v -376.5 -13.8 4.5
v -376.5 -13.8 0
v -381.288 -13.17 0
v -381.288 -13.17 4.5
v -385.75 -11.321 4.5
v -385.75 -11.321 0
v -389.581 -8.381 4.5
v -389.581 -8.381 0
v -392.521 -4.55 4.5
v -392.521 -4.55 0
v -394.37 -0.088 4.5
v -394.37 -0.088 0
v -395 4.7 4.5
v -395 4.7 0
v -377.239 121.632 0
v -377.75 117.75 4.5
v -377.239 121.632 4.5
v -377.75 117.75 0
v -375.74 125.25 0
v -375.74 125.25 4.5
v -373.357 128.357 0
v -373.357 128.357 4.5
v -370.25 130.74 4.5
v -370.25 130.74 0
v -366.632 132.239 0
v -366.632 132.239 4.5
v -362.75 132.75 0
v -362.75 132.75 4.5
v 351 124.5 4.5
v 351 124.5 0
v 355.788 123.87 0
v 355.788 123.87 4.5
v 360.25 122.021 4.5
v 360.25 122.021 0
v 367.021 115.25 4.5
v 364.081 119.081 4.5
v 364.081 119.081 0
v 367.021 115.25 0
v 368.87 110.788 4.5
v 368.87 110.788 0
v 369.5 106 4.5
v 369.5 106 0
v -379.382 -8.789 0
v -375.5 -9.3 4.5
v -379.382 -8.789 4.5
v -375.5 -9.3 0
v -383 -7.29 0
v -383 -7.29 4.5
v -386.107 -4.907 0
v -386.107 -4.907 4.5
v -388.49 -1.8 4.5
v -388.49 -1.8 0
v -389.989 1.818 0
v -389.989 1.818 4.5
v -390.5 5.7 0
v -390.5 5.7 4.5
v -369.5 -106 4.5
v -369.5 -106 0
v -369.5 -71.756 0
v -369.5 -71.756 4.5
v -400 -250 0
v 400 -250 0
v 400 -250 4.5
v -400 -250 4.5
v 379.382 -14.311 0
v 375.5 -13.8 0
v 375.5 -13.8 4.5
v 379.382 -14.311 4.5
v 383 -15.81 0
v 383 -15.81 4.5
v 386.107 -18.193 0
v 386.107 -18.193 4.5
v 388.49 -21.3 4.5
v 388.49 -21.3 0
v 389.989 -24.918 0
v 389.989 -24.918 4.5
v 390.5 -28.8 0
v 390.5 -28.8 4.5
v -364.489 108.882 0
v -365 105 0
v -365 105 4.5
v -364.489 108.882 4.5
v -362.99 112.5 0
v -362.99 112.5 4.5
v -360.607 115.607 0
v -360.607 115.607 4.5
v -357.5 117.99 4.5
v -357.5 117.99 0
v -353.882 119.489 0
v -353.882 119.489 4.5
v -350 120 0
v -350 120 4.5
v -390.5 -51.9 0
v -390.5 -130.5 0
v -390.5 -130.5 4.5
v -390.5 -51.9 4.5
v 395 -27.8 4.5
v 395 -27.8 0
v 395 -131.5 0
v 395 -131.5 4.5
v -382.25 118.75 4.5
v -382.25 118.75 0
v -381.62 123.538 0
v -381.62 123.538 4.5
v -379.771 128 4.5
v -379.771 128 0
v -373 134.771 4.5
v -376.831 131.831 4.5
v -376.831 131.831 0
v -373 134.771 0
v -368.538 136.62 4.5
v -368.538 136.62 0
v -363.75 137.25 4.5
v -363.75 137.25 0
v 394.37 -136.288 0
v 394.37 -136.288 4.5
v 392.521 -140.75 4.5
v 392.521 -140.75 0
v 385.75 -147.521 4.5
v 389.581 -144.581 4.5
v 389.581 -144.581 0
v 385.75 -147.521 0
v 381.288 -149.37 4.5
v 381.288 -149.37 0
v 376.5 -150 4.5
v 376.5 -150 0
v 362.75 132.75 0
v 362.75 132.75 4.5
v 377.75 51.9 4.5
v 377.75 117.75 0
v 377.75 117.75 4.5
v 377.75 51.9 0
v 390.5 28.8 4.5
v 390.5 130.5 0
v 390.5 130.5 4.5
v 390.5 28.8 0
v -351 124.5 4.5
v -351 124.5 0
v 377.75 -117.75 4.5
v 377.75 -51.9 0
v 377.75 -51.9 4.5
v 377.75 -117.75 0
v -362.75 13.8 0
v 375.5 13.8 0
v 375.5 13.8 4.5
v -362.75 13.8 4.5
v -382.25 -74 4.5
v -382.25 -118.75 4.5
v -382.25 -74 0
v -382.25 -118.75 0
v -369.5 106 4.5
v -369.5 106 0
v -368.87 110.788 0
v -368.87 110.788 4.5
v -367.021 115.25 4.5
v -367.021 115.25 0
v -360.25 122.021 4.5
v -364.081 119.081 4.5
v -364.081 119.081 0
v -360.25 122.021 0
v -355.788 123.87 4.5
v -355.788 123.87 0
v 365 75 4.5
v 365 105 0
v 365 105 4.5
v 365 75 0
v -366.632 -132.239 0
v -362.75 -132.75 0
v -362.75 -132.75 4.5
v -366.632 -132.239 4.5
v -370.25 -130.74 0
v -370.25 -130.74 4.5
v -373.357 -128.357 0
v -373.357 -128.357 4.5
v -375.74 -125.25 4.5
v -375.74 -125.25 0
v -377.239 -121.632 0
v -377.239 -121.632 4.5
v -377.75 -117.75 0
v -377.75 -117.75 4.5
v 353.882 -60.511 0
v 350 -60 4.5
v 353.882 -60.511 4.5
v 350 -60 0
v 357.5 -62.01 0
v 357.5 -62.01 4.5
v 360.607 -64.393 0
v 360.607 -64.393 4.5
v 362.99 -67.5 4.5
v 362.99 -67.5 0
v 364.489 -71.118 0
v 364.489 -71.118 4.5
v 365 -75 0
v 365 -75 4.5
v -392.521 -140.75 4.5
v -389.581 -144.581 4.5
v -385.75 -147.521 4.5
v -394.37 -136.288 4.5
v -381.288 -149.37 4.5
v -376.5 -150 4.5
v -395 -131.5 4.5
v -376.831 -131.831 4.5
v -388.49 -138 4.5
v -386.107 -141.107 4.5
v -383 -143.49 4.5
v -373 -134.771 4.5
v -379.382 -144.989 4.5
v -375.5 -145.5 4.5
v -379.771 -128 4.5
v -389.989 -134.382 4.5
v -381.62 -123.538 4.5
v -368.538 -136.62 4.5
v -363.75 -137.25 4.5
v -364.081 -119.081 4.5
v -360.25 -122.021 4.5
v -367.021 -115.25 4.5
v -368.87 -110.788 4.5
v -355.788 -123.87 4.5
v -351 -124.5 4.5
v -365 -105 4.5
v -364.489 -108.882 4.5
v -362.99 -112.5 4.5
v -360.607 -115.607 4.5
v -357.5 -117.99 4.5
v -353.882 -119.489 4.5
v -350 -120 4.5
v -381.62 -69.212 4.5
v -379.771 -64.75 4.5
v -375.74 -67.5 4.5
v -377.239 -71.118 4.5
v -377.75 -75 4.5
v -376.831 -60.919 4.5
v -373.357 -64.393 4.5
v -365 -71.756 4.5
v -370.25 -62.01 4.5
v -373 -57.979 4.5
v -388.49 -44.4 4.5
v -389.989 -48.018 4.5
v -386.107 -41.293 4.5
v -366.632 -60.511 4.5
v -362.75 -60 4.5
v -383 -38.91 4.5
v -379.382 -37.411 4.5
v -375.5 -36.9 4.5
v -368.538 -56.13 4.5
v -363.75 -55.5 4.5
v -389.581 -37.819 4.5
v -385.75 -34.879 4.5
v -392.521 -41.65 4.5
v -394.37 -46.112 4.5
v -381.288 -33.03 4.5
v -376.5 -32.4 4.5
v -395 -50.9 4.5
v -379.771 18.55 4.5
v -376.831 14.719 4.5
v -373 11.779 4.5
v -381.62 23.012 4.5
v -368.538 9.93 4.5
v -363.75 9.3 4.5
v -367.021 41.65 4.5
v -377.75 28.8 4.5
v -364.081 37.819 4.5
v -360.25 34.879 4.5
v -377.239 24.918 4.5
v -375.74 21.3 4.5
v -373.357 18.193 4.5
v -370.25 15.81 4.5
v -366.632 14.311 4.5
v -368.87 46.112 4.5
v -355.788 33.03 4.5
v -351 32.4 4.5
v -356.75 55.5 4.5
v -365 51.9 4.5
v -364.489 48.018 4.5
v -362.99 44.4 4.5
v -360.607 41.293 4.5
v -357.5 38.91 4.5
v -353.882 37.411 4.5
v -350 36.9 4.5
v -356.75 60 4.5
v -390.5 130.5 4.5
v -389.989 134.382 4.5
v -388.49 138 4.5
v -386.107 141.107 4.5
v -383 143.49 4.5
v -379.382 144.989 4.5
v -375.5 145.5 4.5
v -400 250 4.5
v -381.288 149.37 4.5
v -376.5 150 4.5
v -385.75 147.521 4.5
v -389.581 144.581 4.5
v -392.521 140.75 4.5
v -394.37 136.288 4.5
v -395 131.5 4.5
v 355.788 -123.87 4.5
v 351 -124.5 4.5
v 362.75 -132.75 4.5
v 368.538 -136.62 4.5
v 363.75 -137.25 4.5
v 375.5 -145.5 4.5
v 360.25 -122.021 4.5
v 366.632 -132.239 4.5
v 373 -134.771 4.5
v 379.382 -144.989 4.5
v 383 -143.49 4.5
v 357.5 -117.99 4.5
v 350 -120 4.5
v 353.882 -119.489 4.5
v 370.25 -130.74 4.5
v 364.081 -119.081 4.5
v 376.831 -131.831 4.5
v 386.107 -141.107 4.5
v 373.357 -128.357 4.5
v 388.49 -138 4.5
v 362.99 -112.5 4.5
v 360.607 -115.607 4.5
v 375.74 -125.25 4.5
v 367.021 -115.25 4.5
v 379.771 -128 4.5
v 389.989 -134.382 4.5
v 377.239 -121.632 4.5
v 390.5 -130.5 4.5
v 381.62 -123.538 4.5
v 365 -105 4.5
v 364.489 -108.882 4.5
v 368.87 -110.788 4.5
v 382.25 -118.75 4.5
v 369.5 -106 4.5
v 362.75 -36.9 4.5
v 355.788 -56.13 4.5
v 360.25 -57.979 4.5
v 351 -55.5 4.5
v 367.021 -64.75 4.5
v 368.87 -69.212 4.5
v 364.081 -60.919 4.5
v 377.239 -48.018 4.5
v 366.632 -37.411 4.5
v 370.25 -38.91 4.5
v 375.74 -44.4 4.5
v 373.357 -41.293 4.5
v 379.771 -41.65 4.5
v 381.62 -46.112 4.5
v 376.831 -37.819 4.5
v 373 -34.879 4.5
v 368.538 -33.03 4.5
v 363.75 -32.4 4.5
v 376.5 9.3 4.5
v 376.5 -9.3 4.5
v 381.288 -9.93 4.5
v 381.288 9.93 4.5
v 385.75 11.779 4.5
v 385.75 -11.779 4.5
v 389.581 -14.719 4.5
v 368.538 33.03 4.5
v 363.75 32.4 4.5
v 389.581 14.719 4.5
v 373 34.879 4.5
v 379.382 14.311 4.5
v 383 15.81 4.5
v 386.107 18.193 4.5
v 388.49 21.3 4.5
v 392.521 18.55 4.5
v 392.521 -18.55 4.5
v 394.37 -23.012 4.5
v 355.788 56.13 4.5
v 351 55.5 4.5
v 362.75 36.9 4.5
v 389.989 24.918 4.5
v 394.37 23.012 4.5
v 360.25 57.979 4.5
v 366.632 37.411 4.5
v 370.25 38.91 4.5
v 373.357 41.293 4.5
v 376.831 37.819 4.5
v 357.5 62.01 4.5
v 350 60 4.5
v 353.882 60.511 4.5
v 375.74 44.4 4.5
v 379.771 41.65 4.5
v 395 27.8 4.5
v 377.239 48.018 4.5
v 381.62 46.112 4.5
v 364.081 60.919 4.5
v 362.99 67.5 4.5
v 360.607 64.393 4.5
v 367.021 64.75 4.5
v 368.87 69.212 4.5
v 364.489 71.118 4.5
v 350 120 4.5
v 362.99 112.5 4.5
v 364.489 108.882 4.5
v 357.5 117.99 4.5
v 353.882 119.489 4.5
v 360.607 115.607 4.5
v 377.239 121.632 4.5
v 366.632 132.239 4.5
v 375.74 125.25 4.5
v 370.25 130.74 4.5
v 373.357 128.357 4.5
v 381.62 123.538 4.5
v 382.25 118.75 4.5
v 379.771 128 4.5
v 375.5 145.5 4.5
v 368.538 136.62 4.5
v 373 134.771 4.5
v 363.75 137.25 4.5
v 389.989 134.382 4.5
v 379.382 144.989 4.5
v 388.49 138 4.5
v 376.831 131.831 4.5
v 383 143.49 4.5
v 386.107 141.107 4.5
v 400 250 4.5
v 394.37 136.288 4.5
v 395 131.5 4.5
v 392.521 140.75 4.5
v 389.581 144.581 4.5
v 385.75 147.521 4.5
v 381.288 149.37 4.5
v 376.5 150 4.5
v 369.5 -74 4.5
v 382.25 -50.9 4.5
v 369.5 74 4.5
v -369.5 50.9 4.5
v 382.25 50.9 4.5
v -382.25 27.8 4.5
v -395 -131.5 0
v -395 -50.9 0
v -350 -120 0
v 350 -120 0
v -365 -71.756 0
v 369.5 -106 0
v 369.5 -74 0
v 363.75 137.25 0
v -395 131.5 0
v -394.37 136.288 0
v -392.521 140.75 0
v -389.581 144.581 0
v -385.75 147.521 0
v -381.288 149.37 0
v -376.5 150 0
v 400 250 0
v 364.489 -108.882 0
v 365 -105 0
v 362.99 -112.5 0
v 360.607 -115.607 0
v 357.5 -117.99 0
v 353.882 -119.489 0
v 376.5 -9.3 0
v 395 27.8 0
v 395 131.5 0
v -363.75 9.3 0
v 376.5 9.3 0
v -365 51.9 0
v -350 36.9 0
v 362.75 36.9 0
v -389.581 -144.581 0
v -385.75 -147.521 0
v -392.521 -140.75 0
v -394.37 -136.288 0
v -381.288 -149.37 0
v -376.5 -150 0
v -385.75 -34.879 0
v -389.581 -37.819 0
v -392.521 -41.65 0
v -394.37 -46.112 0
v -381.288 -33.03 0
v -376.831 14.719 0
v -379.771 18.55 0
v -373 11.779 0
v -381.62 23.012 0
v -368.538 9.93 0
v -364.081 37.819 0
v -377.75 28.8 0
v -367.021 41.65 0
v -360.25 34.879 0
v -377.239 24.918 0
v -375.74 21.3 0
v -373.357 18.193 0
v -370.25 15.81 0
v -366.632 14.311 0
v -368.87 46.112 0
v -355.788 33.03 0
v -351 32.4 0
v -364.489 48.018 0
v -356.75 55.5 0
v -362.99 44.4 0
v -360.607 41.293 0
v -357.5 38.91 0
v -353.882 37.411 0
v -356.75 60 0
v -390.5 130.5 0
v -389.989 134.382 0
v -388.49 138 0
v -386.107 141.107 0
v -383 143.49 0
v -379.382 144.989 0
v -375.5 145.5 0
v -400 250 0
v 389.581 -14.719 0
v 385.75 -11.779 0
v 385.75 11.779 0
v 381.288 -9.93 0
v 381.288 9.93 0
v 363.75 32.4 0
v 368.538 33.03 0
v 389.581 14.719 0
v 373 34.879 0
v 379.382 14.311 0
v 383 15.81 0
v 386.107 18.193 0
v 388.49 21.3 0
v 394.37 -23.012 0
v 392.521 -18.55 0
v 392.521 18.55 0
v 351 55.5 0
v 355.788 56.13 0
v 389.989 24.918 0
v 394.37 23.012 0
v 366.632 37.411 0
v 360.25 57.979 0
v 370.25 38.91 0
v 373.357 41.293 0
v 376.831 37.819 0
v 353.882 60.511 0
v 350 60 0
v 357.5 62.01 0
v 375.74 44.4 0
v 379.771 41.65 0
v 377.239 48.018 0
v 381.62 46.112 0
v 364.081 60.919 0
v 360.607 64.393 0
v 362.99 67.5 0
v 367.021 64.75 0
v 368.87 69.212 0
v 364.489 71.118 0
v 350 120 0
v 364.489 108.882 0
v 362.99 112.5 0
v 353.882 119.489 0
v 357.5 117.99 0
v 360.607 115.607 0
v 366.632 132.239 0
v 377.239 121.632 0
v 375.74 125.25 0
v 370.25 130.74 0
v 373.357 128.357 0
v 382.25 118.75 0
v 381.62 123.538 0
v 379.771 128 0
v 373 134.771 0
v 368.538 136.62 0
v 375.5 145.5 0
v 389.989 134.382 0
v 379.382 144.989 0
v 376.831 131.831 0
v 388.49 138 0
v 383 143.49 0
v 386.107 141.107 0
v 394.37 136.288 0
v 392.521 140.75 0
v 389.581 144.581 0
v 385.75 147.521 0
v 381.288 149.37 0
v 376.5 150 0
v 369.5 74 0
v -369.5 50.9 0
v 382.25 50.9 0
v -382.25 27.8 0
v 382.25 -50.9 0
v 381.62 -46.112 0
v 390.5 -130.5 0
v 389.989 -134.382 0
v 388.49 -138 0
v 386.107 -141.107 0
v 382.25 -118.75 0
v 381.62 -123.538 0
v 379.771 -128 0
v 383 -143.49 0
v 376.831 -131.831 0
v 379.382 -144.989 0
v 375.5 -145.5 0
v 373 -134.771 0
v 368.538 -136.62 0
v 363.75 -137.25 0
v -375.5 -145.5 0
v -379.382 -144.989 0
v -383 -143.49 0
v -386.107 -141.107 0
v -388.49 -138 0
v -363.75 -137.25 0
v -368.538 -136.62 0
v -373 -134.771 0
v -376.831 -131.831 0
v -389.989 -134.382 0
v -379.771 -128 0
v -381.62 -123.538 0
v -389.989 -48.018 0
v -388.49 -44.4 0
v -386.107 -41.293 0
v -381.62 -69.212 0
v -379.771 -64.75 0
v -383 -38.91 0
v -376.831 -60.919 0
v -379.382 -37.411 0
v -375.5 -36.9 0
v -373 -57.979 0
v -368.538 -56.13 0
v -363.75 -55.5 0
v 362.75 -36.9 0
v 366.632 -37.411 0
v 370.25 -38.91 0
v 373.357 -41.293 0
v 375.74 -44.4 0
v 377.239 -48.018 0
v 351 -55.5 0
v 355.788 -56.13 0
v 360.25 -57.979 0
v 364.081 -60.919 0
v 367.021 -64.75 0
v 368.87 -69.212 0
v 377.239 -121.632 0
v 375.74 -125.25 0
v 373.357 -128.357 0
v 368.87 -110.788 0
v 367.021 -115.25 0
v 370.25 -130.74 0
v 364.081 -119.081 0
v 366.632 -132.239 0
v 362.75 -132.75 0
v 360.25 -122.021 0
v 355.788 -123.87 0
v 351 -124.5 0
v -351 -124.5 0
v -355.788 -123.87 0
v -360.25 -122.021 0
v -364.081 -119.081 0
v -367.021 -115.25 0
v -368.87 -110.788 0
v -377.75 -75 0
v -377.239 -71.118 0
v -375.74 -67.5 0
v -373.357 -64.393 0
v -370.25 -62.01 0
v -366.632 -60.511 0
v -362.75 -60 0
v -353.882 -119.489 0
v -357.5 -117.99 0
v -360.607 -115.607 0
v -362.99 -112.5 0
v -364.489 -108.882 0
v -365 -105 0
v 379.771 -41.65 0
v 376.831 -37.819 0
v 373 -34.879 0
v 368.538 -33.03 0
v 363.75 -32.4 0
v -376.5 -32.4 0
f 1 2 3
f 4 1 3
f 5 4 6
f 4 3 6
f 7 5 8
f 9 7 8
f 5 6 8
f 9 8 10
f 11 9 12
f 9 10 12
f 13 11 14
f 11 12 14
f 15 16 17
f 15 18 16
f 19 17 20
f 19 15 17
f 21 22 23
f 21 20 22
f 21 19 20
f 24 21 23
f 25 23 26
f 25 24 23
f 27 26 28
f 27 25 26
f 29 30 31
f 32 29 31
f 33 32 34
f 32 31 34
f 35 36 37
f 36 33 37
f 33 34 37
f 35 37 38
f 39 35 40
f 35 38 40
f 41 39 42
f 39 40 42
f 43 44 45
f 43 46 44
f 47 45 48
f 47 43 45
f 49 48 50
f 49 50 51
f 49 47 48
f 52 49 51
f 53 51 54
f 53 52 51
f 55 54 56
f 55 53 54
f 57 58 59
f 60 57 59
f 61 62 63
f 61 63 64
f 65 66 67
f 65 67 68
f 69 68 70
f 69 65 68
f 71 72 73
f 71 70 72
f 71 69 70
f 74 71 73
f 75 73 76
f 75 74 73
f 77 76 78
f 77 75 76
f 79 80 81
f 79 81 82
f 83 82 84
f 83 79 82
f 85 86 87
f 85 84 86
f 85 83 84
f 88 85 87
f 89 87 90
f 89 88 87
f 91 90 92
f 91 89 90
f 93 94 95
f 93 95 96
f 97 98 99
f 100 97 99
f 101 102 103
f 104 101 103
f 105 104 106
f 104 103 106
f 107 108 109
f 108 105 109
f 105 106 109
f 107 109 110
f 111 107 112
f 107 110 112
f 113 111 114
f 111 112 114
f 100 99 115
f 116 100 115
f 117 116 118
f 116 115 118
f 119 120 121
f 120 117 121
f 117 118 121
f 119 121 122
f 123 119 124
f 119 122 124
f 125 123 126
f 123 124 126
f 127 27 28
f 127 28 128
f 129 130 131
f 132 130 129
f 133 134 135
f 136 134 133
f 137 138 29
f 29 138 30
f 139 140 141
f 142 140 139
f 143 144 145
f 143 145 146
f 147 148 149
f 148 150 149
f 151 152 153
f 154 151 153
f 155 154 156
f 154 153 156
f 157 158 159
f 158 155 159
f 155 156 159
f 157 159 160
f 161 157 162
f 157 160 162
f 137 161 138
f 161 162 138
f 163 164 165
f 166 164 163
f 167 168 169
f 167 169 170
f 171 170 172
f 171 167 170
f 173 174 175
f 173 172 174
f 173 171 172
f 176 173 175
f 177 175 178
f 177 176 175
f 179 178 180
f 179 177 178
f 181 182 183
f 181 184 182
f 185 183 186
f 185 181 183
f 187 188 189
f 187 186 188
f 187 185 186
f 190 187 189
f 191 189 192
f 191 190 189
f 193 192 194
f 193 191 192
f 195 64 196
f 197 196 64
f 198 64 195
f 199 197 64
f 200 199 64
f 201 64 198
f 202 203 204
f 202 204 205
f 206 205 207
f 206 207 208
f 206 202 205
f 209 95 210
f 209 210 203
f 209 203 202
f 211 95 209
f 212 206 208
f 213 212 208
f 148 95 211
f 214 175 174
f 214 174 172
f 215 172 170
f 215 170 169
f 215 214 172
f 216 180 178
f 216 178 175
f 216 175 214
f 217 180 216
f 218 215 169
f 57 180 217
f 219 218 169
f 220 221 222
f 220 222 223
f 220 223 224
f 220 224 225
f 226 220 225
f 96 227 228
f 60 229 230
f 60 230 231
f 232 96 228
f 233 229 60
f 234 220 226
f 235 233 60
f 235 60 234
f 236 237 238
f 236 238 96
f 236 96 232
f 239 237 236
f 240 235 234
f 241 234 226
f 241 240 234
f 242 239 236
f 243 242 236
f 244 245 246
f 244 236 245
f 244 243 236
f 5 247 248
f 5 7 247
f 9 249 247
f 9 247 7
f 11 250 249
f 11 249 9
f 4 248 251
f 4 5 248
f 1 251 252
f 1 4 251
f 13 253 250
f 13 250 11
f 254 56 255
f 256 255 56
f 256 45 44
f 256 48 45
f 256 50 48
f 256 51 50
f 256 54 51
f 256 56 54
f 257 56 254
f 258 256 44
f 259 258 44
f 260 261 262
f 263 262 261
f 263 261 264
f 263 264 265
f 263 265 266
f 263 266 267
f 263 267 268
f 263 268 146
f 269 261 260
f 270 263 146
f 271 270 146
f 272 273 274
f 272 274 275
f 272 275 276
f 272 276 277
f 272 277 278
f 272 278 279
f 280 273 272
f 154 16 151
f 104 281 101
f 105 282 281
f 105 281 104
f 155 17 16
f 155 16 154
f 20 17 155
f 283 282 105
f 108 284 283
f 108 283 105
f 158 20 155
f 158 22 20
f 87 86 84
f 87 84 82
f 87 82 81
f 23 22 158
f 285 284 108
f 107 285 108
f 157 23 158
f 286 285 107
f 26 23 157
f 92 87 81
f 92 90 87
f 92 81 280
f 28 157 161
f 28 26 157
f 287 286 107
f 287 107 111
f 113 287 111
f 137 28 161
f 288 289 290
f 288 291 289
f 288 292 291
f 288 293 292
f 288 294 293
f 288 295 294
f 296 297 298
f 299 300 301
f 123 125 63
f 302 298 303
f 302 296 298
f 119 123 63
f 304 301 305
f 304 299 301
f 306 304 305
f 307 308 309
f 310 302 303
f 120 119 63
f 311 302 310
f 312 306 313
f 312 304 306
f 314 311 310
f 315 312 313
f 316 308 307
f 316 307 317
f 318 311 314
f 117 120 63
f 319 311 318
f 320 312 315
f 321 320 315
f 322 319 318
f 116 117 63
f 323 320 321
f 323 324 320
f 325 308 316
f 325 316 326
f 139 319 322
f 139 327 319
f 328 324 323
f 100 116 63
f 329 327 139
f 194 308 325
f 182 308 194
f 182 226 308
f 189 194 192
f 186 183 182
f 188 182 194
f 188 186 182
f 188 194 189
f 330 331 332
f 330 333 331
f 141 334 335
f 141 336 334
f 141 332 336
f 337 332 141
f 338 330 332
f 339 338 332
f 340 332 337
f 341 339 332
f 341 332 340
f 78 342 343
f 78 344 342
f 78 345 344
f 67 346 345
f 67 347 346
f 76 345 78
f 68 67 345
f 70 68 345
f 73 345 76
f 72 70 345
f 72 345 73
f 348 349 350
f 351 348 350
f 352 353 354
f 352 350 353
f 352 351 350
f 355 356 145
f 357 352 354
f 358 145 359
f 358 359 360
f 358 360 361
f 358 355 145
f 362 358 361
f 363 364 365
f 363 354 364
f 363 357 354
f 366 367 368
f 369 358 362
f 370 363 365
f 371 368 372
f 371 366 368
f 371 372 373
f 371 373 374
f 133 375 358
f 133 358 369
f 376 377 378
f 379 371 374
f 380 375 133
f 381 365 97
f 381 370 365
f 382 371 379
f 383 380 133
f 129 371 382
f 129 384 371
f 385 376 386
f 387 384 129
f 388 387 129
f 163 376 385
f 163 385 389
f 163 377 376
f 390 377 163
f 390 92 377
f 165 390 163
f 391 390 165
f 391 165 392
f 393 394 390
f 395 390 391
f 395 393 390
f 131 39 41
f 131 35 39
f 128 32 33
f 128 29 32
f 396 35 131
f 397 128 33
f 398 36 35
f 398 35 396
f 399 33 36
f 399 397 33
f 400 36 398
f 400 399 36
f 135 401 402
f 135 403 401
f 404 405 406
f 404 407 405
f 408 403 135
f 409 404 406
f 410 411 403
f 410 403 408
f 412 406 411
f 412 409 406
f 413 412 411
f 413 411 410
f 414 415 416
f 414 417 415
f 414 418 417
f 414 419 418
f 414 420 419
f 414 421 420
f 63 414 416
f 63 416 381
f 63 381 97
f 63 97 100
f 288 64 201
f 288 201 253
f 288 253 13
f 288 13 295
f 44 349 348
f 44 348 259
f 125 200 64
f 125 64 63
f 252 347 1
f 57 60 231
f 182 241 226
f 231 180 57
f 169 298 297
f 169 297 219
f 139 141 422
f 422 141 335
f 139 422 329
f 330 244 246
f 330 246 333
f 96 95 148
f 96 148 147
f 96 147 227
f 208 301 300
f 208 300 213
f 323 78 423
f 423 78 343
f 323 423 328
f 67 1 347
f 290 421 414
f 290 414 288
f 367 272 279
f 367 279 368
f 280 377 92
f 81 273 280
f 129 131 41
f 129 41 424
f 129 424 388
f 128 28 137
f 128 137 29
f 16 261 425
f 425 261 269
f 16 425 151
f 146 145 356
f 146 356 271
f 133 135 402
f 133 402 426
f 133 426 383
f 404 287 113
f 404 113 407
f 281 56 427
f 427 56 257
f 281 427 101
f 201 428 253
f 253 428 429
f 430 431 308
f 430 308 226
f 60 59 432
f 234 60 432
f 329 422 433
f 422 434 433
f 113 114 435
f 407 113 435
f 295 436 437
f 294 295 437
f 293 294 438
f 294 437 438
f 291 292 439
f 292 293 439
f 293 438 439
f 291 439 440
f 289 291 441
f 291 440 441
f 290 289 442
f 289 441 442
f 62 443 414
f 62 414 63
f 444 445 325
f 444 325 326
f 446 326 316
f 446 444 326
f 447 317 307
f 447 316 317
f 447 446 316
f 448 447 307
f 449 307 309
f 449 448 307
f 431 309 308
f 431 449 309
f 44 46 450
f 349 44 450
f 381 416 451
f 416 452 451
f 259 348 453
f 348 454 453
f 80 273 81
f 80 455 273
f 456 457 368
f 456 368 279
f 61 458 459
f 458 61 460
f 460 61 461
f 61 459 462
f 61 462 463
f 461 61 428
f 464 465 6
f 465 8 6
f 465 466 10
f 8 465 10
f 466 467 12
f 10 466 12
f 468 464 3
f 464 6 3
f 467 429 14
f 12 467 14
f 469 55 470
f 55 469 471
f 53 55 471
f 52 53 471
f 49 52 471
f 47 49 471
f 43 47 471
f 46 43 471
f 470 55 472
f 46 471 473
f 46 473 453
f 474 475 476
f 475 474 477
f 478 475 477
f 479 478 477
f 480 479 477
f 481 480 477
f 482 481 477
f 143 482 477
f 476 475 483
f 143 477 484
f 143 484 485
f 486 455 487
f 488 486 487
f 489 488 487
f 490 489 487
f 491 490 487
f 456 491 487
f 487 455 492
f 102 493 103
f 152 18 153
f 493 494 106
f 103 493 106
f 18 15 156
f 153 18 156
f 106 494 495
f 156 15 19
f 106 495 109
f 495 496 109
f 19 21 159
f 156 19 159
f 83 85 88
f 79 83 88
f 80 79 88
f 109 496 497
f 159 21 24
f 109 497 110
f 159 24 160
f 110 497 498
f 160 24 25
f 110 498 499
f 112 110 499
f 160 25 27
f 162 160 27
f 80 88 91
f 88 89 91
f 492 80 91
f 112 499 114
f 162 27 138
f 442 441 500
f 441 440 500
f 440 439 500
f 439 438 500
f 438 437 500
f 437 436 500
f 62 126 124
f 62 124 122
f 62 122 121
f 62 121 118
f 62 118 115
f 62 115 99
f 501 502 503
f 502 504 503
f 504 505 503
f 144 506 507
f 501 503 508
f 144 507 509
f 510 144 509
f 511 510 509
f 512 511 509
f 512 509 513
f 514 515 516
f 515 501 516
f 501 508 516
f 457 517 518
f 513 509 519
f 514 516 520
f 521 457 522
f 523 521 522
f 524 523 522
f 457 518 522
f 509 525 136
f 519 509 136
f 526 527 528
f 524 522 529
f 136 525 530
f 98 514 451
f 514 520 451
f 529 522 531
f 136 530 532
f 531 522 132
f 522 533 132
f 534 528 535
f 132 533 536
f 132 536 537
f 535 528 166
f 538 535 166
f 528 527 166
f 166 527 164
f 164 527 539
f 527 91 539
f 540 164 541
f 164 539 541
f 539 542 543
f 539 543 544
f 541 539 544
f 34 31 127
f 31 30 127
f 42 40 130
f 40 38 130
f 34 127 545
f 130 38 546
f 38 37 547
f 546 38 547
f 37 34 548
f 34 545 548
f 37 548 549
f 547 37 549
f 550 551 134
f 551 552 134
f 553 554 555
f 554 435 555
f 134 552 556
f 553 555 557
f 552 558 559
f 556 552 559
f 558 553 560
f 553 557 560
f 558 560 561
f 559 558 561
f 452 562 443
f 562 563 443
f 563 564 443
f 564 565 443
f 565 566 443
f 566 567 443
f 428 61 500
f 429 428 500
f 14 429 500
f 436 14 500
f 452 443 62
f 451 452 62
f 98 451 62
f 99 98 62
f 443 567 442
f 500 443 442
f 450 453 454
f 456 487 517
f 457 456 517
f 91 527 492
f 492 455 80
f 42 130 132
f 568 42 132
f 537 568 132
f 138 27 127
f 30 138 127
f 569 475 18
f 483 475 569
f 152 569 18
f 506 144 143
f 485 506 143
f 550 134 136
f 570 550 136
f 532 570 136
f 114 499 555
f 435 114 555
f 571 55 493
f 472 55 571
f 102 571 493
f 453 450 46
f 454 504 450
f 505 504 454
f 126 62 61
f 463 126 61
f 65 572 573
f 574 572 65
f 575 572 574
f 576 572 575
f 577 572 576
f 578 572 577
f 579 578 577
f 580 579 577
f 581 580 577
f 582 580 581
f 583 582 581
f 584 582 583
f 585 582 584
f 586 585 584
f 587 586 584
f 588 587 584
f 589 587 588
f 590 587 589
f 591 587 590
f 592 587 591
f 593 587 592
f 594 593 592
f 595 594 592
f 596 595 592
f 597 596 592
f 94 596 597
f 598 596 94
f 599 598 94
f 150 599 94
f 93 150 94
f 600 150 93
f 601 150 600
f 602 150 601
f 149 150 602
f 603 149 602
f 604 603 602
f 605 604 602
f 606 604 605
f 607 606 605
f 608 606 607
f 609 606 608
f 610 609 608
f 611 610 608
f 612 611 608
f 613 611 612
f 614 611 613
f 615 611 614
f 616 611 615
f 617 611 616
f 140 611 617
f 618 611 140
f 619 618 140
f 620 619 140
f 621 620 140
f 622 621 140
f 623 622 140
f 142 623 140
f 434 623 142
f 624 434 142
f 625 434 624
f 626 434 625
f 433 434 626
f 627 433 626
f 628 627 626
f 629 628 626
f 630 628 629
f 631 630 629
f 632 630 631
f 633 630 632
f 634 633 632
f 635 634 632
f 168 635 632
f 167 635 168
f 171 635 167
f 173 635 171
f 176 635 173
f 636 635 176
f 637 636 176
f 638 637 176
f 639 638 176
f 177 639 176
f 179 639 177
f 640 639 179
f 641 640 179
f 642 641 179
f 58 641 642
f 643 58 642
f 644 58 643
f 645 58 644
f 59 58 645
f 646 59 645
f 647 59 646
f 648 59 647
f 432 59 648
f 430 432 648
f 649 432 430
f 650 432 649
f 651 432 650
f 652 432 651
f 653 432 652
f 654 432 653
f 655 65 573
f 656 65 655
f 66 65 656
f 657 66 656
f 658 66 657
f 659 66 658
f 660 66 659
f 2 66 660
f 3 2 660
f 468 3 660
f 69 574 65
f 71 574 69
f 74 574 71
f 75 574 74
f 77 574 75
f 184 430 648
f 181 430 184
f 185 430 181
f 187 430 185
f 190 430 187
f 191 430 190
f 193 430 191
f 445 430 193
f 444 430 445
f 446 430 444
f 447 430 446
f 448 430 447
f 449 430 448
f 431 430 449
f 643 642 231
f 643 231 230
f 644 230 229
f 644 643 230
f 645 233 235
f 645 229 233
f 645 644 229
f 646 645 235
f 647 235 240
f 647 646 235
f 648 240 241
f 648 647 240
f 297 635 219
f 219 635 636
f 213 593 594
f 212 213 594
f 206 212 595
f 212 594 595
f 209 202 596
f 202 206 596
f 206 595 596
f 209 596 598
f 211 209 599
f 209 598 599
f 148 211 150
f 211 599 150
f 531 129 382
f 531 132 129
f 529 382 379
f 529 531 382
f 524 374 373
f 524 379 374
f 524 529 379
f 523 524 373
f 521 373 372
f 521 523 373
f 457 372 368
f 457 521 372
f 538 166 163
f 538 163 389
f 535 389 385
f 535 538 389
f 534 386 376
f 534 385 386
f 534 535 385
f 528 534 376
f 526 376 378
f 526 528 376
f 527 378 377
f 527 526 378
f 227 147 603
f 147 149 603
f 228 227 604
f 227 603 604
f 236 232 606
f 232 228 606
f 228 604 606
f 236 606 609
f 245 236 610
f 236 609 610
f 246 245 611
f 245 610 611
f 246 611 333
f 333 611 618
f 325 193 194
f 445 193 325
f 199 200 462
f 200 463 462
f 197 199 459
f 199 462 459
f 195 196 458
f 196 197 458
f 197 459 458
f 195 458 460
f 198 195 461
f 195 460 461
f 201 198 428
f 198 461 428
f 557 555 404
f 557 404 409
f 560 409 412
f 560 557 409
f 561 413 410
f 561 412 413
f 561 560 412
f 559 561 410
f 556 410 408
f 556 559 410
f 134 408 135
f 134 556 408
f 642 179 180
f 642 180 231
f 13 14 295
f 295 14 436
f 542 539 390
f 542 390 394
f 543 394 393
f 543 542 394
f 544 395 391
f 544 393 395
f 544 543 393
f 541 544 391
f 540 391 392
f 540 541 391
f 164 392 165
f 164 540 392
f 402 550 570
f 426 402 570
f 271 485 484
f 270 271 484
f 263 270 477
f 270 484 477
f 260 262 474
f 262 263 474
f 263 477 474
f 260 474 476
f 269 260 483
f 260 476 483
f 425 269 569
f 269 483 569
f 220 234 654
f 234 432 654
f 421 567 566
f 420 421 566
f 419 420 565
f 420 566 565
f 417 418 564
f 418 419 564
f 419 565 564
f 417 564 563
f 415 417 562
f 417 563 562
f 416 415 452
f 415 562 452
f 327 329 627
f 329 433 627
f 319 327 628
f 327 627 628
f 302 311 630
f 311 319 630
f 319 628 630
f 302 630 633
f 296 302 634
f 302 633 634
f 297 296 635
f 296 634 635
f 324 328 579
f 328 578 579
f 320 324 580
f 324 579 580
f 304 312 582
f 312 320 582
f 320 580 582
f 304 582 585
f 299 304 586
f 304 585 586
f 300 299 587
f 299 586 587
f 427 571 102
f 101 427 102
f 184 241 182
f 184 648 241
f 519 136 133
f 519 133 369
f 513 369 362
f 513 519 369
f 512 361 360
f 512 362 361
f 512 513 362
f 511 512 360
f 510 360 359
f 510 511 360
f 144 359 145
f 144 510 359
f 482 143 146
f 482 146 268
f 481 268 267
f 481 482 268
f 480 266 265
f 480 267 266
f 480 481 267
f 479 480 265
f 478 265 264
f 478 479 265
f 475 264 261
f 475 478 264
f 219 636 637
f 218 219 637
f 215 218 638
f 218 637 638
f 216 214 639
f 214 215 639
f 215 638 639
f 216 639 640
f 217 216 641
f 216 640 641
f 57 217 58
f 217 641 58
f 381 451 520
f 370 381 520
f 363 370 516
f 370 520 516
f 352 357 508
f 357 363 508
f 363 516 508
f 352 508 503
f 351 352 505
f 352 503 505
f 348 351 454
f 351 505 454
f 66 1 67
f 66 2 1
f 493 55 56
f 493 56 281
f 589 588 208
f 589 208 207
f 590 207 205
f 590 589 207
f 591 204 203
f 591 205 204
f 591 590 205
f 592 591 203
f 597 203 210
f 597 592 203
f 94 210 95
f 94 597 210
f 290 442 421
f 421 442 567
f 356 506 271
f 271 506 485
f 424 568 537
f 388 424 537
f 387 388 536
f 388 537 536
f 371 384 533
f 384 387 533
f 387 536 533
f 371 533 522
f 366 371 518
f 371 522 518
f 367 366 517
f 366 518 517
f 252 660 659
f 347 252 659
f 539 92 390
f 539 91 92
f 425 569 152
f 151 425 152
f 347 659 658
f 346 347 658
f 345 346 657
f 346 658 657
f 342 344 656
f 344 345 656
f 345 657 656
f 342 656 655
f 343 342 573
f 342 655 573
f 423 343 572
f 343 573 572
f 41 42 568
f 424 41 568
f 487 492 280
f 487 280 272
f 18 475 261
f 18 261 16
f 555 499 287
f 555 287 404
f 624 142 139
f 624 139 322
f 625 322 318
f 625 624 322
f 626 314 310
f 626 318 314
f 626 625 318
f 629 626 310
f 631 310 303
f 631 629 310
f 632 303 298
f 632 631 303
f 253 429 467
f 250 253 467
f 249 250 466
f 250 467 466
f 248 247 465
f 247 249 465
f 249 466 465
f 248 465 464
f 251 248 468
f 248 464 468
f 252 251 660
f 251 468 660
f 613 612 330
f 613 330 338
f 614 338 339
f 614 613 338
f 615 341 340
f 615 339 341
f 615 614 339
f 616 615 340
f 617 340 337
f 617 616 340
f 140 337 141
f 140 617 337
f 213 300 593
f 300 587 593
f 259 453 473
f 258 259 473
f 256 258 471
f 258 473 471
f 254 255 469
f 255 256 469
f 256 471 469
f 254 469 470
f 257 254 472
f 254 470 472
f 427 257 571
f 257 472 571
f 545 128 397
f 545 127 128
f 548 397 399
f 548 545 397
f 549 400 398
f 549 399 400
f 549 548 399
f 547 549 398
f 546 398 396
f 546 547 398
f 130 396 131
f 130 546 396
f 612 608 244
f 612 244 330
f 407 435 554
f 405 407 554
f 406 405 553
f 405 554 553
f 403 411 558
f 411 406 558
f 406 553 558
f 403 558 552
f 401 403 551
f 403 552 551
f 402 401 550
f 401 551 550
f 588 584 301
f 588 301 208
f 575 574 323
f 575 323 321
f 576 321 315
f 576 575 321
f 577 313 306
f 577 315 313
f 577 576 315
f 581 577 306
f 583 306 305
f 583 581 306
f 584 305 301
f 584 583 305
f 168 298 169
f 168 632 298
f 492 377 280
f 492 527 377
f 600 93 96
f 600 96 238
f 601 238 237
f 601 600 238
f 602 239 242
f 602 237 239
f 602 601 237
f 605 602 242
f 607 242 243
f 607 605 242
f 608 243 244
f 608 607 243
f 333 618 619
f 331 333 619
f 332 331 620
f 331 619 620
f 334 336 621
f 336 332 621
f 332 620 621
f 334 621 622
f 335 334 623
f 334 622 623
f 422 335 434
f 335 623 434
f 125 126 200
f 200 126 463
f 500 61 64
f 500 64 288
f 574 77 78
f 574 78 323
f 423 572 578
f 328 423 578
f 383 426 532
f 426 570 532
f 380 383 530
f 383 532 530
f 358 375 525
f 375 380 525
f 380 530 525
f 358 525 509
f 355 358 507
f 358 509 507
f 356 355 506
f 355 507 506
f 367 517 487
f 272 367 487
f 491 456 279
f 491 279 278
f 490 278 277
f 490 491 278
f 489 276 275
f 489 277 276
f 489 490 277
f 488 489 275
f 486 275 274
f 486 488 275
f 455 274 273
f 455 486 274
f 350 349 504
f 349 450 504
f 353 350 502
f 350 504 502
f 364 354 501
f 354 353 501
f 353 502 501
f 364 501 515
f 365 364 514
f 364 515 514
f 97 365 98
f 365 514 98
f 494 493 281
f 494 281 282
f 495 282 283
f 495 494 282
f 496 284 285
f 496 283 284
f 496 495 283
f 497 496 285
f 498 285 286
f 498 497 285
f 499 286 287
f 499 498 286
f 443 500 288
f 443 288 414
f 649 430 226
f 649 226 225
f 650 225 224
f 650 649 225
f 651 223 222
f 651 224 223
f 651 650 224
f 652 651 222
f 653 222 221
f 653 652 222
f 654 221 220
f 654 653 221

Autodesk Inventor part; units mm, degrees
ref_plane "YZ Plane" through (0, 0, 0) normal (1, 0, 0) x (0, 1, 0)
ref_plane "XZ Plane" through (0, 0, 0) normal (0, 1, 0) x (-1, 0, 0)
sketch "layer_layout_sketch" plane through (0, 0, 0) normal (0, 0, 1) x (1, 0, 0)
  line L0 (-400, 250) -> (400, 250)
  line L1 (400, 250) -> (400, -250)
  line L2 (400, -250) -> (-400, -250)
  line L3 (-400, -250) -> (-400, 250)
  line L4 (0, 250) -> (0, -250) construction
  line L5 (-400, 200) -> (400, 200)
  line L6 (400, 200) -> (400, -200)
  line L7 (400, -200) -> (-400, -200)
  line L8 (-400, -200) -> (-400, 200)
  line L9 (0, 200) -> (0, -200) construction
  line L10 (-400, 150) -> (400, 150)
  line L11 (400, 150) -> (400, -150)
  line L12 (400, -150) -> (-400, -150)
  line L13 (-400, -150) -> (-400, 150)
  line L14 (0, 150) -> (0, -150) construction
  point P0 (0, 0)
  point P1 (0, 0)
  dimension "d116" = 500
  dimension "d117" = 800
  dimension "d122" = 400
  dimension "d123" = 300
sketch "coil_layer_sketch_lower" plane through (0, 0, 0) normal (0, 0, 1) x (1, 0, 0)
  line L0 (0, -9.3) -> (376.5, -9.3)
  line L1 (395, -27.8) -> (395, -131.5)
  line L2 (376.5, -150) -> (-376.5, -150)
  line L3 (-395, -131.5) -> (-395, -50.9)
  line L4 (0, -9.3) -> (0, -13.8)
  line L5 (0, -13.8) -> (375.5, -13.8)
  line L6 (390.5, -28.8) -> (390.5, -130.5)
  line L7 (375.5, -145.5) -> (-375.5, -145.5)
  line L8 (-376.5, -32.4) -> (363.75, -32.4)
  line L9 (382.25, -50.9) -> (382.25, -118.75)
  line L10 (363.75, -137.25) -> (-363.75, -137.25)
  line L11 (-390.5, -130.5) -> (-390.5, -51.9)
  line L12 (-375.5, -36.9) -> (362.75, -36.9)
  line L13 (377.75, -51.9) -> (377.75, -117.75)
  line L14 (362.75, -132.75) -> (-362.75, -132.75)
  line L15 (-377.75, -117.75) -> (-377.75, -75)
  line L16 (-382.25, -118.75) -> (-382.25, -74)
  line L17 (-363.75, -55.5) -> (351, -55.5)
  line L18 (369.5, -74) -> (369.5, -106)
  line L19 (-362.75, -60) -> (350, -60)
  line L20 (365, -75) -> (365, -105)
  line L21 (-558.3641, 0) -> (558.3641, 0) projected
  line L22 (350, -120) -> (-350, -120)
  line L23 (351, -124.5) -> (-351, -124.5)
  line L24 (-369.5, -106) -> (-369.5, -71.7563)
  line L25 (-369.5, -71.7563) -> (-365, -71.7563)
  line L26 (-365, -71.7563) -> (-365, -105)
  arc A0 (395, -27.8) -> (376.5, -9.3) centre (376.5, -27.8) ccw
  arc A1 (382.25, -50.9) -> (363.75, -32.4) centre (363.75, -50.9) ccw
  arc A2 (369.5, -74) -> (351, -55.5) centre (351, -74) ccw
  arc A3 (351, -124.5) -> (369.5, -106) centre (351, -106) ccw
  arc A4 (363.75, -137.25) -> (382.25, -118.75) centre (363.75, -118.75) ccw
  arc A5 (376.5, -150) -> (395, -131.5) centre (376.5, -131.5) ccw
  arc A6 (-395, -131.5) -> (-376.5, -150) centre (-376.5, -131.5) ccw
  arc A7 (-382.25, -118.75) -> (-363.75, -137.25) centre (-363.75, -118.75) ccw
  arc A8 (-369.5, -106) -> (-351, -124.5) centre (-351, -106) ccw
  arc A9 (-376.5, -32.4) -> (-395, -50.9) centre (-376.5, -50.9) ccw
  arc A10 (-363.75, -55.5) -> (-382.25, -74) centre (-363.75, -74) ccw
  arc A11 (-375.5, -36.9) -> (-390.5, -51.9) centre (-375.5, -51.9) ccw
  arc A12 (-362.75, -60) -> (-377.75, -75) centre (-362.75, -75) ccw
  arc A13 (-390.5, -130.5) -> (-375.5, -145.5) centre (-375.5, -130.5) ccw
  arc A14 (-377.75, -117.75) -> (-362.75, -132.75) centre (-362.75, -117.75) ccw
  arc A15 (-365, -105) -> (-350, -120) centre (-350, -105) ccw
  arc A16 (350, -120) -> (365, -105) centre (350, -105) ccw
  arc A17 (362.75, -132.75) -> (377.75, -117.75) centre (362.75, -117.75) ccw
  arc A18 (375.5, -145.5) -> (390.5, -130.5) centre (375.5, -130.5) ccw
  arc A19 (377.75, -51.9) -> (362.75, -36.9) centre (362.75, -51.9) ccw
  arc A20 (390.5, -28.8) -> (375.5, -13.8) centre (375.5, -28.8) ccw
  arc A21 (365, -75) -> (350, -60) centre (350, -75) ccw
  point P0 (0, 0)
  point P1 (0, 0)
  point P2 (368.0934, -60)
  point P3 (370, -61.9066)
  point P4 (0, -150)
  dimension "d1" = 4.5
  dimension "d2" = 4.5
  dimension "d3" = 4.5
  dimension "d4" = 9.3
  dimension "d5" = 790
  dimension "d6" = 395
  dimension "d7" = 4.5
  dimension "d8" = 4.5
  dimension "d9" = 8.25
  dimension "d10" = 4.5
  dimension "d11" = 18.6
  dimension "d12" = 4.5
  dimension "d13" = 8.25
  dimension "d14" = 4.5
  dimension "d15" = 4.5
  dimension "d16" = 4.5
  dimension "d17" = 8.25
  dimension "d19" = 18.6
  dimension "d20" = 8.25
  dimension "d82" = 150
  dimension "d88" = 4.5
  dimension "d89" = 8.25
  dimension "d96" = 4.5
  dimension "d97" = 8.25
  dimension "d98" = 18.5
  dimension "d99" = 15
  dimension "d109" = 15
sketch "coil_layer_sketch_upper" plane through (0, 0, 0) normal (0, 0, 1) x (1, 0, 0)
  line L0 (0, -13.8) -> (-376.5, -13.8)
  line L1 (-395, 4.7) -> (-395, 131.5)
  line L2 (-376.5, 150) -> (376.5, 150)
  line L3 (395, 131.5) -> (395, 27.8)
  line L4 (0, -9.3) -> (-375.5, -9.3)
  line L5 (-390.5, 5.7) -> (-390.5, 130.5)
  line L6 (-375.5, 145.5) -> (375.5, 145.5)
  line L7 (390.5, 130.5) -> (390.5, 28.8)
  line L8 (375.5, 13.8) -> (-362.75, 13.8)
  line L9 (-377.75, 28.8) -> (-377.75, 117.75)
  line L10 (376.5, 9.3) -> (-363.75, 9.3)
  line L11 (-382.25, 27.8) -> (-382.25, 118.75)
  line L12 (-362.75, 132.75) -> (362.75, 132.75)
  line L13 (-363.75, 137.25) -> (363.75, 137.25)
  line L14 (377.75, 117.75) -> (377.75, 51.9)
  line L15 (362.75, 36.9) -> (-350, 36.9)
  line L16 (382.25, 118.75) -> (382.25, 50.9)
  line L17 (363.75, 32.4) -> (-351, 32.4)
  line L18 (-365, 51.9) -> (-365, 105)
  line L19 (-350, 120) -> (350, 120)
  line L20 (365, 105) -> (365, 75)
  line L21 (350, 60) -> (-356.75, 60)
  line L22 (-369.5, 50.9) -> (-369.5, 106)
  line L23 (-351, 124.5) -> (351, 124.5)
  line L24 (369.5, 106) -> (369.5, 74)
  line L25 (351, 55.5) -> (-356.75, 55.5)
  line L26 (-356.75, 60) -> (-356.75, 55.5)
  line L27 (-700, 0) -> (700, 0)
  line L28 (-980, 0) -> (980, 0) projected
  line L29 (0, -13.8) -> (0, -9.3)
  line L30 (0, -51.9241) -> (0, 188.1241) projected
  arc A0 (365, 105) -> (350, 120) centre (350, 105) ccw
  arc A1 (350, 60) -> (365, 75) centre (350, 75) ccw
  arc A2 (377.75, 117.75) -> (362.75, 132.75) centre (362.75, 117.75) ccw
  arc A3 (362.75, 36.9) -> (377.75, 51.9) centre (362.75, 51.9) ccw
  arc A4 (390.5, 130.5) -> (375.5, 145.5) centre (375.5, 130.5) ccw
  arc A5 (375.5, 13.8) -> (390.5, 28.8) centre (375.5, 28.8) ccw
  arc A6 (-350, 120) -> (-365, 105) centre (-350, 105) ccw
  arc A7 (-365, 51.9) -> (-350, 36.9) centre (-350, 51.9) ccw
  arc A8 (-377.75, 28.8) -> (-362.75, 13.8) centre (-362.75, 28.8) ccw
  arc A9 (-390.5, 5.7) -> (-375.5, -9.3) centre (-375.5, 5.7) ccw
  arc A10 (-362.75, 132.75) -> (-377.75, 117.75) centre (-362.75, 117.75) ccw
  arc A11 (-375.5, 145.5) -> (-390.5, 130.5) centre (-375.5, 130.5) ccw
  arc A12 (-376.5, 150) -> (-395, 131.5) centre (-376.5, 131.5) ccw
  arc A13 (-363.75, 137.25) -> (-382.25, 118.75) centre (-363.75, 118.75) ccw
  arc A14 (-351, 124.5) -> (-369.5, 106) centre (-351, 106) ccw
  arc A15 (-369.5, 50.9) -> (-351, 32.4) centre (-351, 50.9) ccw
  arc A16 (-382.25, 27.8) -> (-363.75, 9.3) centre (-363.75, 27.8) ccw
  arc A17 (-395, 4.7) -> (-376.5, -13.8) centre (-376.5, 4.7) ccw
  arc A18 (351, 55.5) -> (369.5, 74) centre (351, 74) ccw
  arc A19 (363.75, 32.4) -> (382.25, 50.9) centre (363.75, 50.9) ccw
  arc A20 (376.5, 9.3) -> (395, 27.8) centre (376.5, 27.8) ccw
  arc A21 (395, 131.5) -> (376.5, 150) centre (376.5, 131.5) ccw
  arc A22 (382.25, 118.75) -> (363.75, 137.25) centre (363.75, 118.75) ccw
  arc A23 (369.5, 106) -> (351, 124.5) centre (351, 106) ccw
  point P0 (0, 0)
  point P1 (395, 9.3)
  point P2 (-382.25, 9.3)
  point P3 (0, 150)
  point P4 (-700, 0)
  point P5 (700, 0)
  point P6 (0, 150)
  dimension "d58" = 4.5
  dimension "d59" = 4.5
  dimension "d60" = 4.5
  dimension "d61" = 8.25
  dimension "d62" = 8.25
  dimension "d64" = 4.5
  dimension "d65" = 4.5
  dimension "d66" = 4.5
  dimension "d67" = 8.25
  dimension "d69" = 18.6
  dimension "d70" = 4.5
  dimension "d71" = 4.5
  dimension "d72" = 18.6
  dimension "d73" = 8.25
  dimension "d74" = 8.25
  dimension "d75" = 4.5
  dimension "d77" = 18.6
  dimension "d78" = 4.5
  dimension "d79" = 4.5
  dimension "d80" = 4.5
  dimension "d83" = 150
  dimension "d87" = 8.25
  dimension "d91" = 4.5
  dimension "d92" = 9.3
  dimension "d93" = 790
  dimension "d100" = 15
  dimension "d101" = 18.5
  dimension "d102" = 8.25
extrude "layer_sheet Extrude" add sketch "layer_layout_sketch" along normal blind 4.5
extrude "wire_holes_upper Cut" cut sketch "coil_layer_sketch_upper" along normal blind 4.5 contours L0 A17 L27 A9 L4 L29 | A17 L1 A12 L2 L30 L6 A11 L5 A9 L27 | L30 L8 A5 L7 A4 L6 L2 A21 L3 A20 L10 | L10 A16 L11 A13 L13 L30 L12 A10 L9 A8 L8 | L30 L15 A3 L14 A2 L12 L13 A22 L16 A19 L17 | L17 A15 L22 A14 L23 L30 L19 A6 L18 A7 L15 | L30 L21 A1 L20 A0 L19 L23 A23 L24 A18 L25 | L25 L26 L21 L30
extrude "wire_holes_lower Cut" cut sketch "coil_layer_sketch_lower" along normal blind 4.5
sketch "Sketch6" plane through (0, 0, 4.5) normal (0, 0, 1) x (1, 0, 0)
  circle A0 centre (-353, 57.75) radius 3
  line L0 (400, 250) -> (-400, 250) projected
  line L1 (-400, 250) -> (-400, -250) projected
  line L2 (-400, -250) -> (400, -250) projected
  circle A1 centre (-353, -122) radius 3
  point P0 (0, 0)
  dimension "d124" = 6
  dimension "d125" = 192.25
  dimension "d126" = 47
  dimension "d130" = 6
  dimension "d131" = 128
  dimension "d132" = 47
equation "\"d1\" = wire_diameter"
equation "\"d2\" = wire_diameter"
equation "\"d3\" = wire_diameter"
equation "\"d4\" = 0.5 * distance_between_wires"
equation "\"d6\" = 0.5 * track_length"
equation "\"d7\" = wire_diameter"
equation "\"d8\" = wire_diameter"
equation "\"d9\" = distance_between_wires_edge"
equation "\"d10\" = wire_diameter"
equation "\"d11\" = distance_between_wires"
equation "\"d12\" = wire_diameter"
equation "\"d13\" = distance_between_wires_edge"
equation "\"d14\" = wire_diameter"
equation "\"d15\" = wire_diameter"
equation "\"d16\" = wire_diameter"
equation "\"d17\" = distance_between_wires_edge"
equation "\"d19\" = distance_between_wires"
equation "\"d20\" = distance_between_wires_edge"
equation "\"d82\" = 0.5 * track_width"
equation "\"d58\" = wire_diameter"
equation "\"d59\" = wire_diameter"
equation "\"d60\" = wire_diameter"
equation "\"d61\" = distance_between_wires_edge"
equation "\"d62\" = distance_between_wires_edge"
equation "\"d64\" = wire_diameter"
equation "\"d65\" = wire_diameter"
equation "\"d66\" = wire_diameter"
equation "\"d67\" = distance_between_wires_edge"
equation "\"d69\" = distance_between_wires"
equation "\"d70\" = wire_diameter"
equation "\"d71\" = wire_diameter"
equation "\"d72\" = distance_between_wires"
equation "\"d73\" = distance_between_wires_edge"
equation "\"d74\" = distance_between_wires_edge"
equation "\"d75\" = wire_diameter"
equation "\"d77\" = distance_between_wires"
equation "\"d78\" = wire_diameter"
equation "\"d79\" = wire_diameter"
equation "\"d80\" = wire_diameter"
equation "\"d83\" = 0.5 * track_width"
equation "\"wire_diameter\" = 4.5"
equation "\"distance_between_wires\" = -1.2 * wire_diameter + 0.2 * parameter_6"
equation "\"distance_between_wires_edge\" = 8.25"
equation "\"bend_radius_inner\" = 15"
equation "\"bend_radius_outer\" = 18.5"
equation "\"track_width\" = 300"
equation "\"parameter_6\" = 120"
equation "\"track_length\" = 790"
properties part number "primary_coil_0R2"
